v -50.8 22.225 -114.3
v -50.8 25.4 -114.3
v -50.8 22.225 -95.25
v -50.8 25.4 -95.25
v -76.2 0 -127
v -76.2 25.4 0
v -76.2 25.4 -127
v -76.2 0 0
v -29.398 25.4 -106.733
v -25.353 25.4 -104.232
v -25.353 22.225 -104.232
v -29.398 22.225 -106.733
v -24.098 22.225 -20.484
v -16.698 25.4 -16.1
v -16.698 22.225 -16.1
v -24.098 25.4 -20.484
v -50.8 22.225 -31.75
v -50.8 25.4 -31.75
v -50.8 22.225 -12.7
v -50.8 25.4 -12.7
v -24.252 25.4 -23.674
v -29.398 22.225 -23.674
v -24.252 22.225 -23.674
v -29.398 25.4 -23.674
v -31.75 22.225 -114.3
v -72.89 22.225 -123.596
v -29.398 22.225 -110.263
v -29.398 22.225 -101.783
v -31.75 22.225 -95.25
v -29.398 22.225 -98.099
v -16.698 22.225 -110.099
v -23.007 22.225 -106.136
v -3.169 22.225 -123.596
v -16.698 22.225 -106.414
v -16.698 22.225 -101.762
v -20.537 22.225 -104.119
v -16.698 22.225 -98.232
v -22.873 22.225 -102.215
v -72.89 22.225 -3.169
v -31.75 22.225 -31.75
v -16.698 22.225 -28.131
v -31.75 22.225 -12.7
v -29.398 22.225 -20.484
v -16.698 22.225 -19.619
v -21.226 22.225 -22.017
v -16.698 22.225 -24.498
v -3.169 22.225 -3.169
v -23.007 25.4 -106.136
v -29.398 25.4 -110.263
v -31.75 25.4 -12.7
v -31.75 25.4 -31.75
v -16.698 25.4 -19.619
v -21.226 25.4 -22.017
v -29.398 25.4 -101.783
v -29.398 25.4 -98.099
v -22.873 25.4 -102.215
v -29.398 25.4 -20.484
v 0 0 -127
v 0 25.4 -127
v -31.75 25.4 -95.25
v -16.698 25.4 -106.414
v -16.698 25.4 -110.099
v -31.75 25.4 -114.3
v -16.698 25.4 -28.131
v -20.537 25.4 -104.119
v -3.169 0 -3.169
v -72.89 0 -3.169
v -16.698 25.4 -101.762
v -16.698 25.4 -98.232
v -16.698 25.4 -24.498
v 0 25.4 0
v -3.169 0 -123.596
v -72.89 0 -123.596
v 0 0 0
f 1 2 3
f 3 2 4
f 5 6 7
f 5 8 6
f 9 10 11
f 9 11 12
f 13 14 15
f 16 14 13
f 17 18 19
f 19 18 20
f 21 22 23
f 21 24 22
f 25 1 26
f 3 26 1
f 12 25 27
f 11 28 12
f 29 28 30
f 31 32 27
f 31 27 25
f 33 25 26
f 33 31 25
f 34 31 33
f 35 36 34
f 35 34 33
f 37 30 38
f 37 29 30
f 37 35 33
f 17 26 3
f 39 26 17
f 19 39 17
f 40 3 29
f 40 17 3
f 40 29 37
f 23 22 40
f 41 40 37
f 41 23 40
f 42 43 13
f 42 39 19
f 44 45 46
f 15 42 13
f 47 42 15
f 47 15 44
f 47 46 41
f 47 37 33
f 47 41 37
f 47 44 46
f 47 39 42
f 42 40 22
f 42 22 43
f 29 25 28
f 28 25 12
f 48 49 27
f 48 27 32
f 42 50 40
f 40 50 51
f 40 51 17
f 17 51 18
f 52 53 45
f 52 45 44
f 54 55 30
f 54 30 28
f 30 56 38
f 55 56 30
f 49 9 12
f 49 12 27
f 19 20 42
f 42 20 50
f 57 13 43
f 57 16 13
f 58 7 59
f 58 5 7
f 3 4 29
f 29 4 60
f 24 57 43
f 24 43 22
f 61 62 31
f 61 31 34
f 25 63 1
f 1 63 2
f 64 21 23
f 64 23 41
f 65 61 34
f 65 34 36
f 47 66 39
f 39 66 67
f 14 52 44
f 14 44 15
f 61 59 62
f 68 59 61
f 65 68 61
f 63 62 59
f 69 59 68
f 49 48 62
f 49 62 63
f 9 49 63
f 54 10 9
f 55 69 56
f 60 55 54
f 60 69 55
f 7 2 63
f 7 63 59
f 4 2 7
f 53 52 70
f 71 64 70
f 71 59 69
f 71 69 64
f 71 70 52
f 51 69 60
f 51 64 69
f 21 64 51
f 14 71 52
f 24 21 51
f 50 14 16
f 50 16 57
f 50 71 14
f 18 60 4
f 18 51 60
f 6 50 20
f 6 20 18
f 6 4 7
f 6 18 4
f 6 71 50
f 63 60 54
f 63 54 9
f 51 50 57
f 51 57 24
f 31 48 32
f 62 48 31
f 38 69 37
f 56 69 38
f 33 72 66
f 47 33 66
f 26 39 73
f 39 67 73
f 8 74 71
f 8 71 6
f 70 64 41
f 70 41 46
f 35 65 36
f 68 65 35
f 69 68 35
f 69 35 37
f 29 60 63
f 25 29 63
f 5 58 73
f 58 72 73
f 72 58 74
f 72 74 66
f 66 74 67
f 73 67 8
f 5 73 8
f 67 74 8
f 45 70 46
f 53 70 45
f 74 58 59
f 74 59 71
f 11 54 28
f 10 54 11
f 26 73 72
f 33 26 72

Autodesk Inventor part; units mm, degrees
ref_plane "YZ Plane" through (0, 0, 0) normal (1, 0, 0) x (0, 1, 0)
ref_plane "XZ Plane" through (0, 0, 0) normal (0, 1, 0) x (-1, 0, 0)
ref_plane "XY Plane" through (0, 0, 0) normal (0, 0, 1) x (1, 0, 0)
sketch "Sketch1" plane through (0, 0, 0) normal (0, 1, 0) x (-1, 0, 0)
  line L0 (0, 0) -> (76.2, 0)
  line L1 (76.2, 0) -> (76.2, -127)
  line L2 (76.2, -127) -> (0, -127)
  line L3 (0, -127) -> (0, 0)
  dimension "d0" = 76.2
  dimension "d1" = 127
extrude "Extrusion1" add sketch "Sketch1" along normal blind 25.4
sketch "Sketch2" plane through (0, 0, 0) normal (0, -1, 0) x (1, 0, 0)
  line L0 (-3.1691, -3.1691) -> (-72.8902, -3.1691)
  line L1 (-72.8902, -3.1691) -> (-72.8902, -123.5964)
  line L2 (-72.8902, -123.5964) -> (-3.1691, -123.5964)
  line L3 (-3.1691, -123.5964) -> (-3.1691, -3.1691)
  point P0 (0, 0)
extrude "Extrusion2" cut sketch "Sketch2" against normal blind 22.225
sketch "Sketch3" plane through (0, 25.4, 0) normal (0, 1, 0) x (1, 0, 0)
  line L0 (-50.8, 12.7) -> (-31.75, 12.7)
  line L1 (-31.75, 12.7) -> (-31.75, 31.75)
  line L2 (-31.75, 31.75) -> (-50.8, 31.75)
  line L3 (-50.8, 31.75) -> (-50.8, 12.7)
  line L4 (-50.8, 95.25) -> (-31.75, 95.25)
  line L5 (-31.75, 95.25) -> (-31.75, 114.3)
  line L6 (-31.75, 114.3) -> (-50.8, 114.3)
  line L7 (-50.8, 114.3) -> (-50.8, 95.25)
  line L8 (-76.2, 127) -> (-76.2, 0) projected
  line L9 (-76.2, 0) -> (0, 0) projected
  line L10 (0, 127) -> (-76.2, 127) projected
  dimension "d6" = 19.05
  dimension "d7" = 19.05
  dimension "d8" = 25.4
  dimension "d9" = 25.4
  dimension "d10" = 19.05
  dimension "d11" = 19.05
  dimension "d12" = 12.7
  dimension "d13" = 12.7
extrude "Extrusion3" cut sketch "Sketch3" against normal blind 22.225
sketch "Sketch4" plane through (0, 25.4, 0) normal (0, 1, 0) x (1, 0, 0)
  line L0 (-13.7708, 110.3112) -> (-13.7708, 97.845) construction
  line L1 (-13.7708, 97.845) -> (-32.3251, 97.845) construction
  line L2 (-32.3251, 97.845) -> (-32.3251, 110.3112) construction
  line L3 (-32.3251, 110.3112) -> (-13.7708, 110.3112) construction
  line L4 (-12.0313, 30.7306) -> (-12.0313, 13.191) construction
  line L5 (-12.0313, 13.191) -> (-34.0646, 13.191) construction
  line L6 (-34.0646, 13.191) -> (-34.0646, 30.7306) construction
  line L7 (-34.0646, 30.7306) -> (-12.0313, 30.7306) construction
  line L8 (-29.3979, 98.0986) -> (-29.3979, 101.783)
  line L9 (-29.3979, 101.783) -> (-25.3533, 104.2325)
  line L10 (-25.3533, 104.2325) -> (-29.3979, 106.7333)
  line L11 (-29.3979, 106.7333) -> (-29.3979, 110.2634)
  line L12 (-29.3979, 110.2634) -> (-23.0068, 106.1364)
  line L13 (-23.0068, 106.1364) -> (-16.6979, 110.0987)
  line L14 (-16.6979, 110.0987) -> (-16.6979, 106.4143)
  line L15 (-16.6979, 106.4143) -> (-20.5367, 104.1192)
  line L16 (-20.5367, 104.1192) -> (-16.6979, 101.7624)
  line L17 (-16.6979, 101.7624) -> (-16.6979, 98.2324)
  line L18 (-16.6979, 98.2324) -> (-22.873, 102.2153)
  line L19 (-22.873, 102.2153) -> (-29.3979, 98.0986)
  line L20 (-16.6979, 16.0996) -> (-24.0977, 20.4839)
  line L21 (-24.0977, 20.4839) -> (-29.3979, 20.4839)
  line L22 (-29.3979, 20.4839) -> (-29.3979, 23.6743)
  line L23 (-29.3979, 23.6743) -> (-24.2521, 23.6743)
  line L24 (-24.2521, 23.6743) -> (-16.6979, 28.1307)
  line L25 (-16.6979, 28.1307) -> (-16.6979, 24.4977)
  line L26 (-16.6979, 24.4977) -> (-21.2263, 22.0174)
  line L27 (-21.2263, 22.0174) -> (-16.6979, 19.6194)
  line L28 (-16.6979, 19.6194) -> (-16.6979, 16.0996)
  point P0 (0, 0)
extrude "Extrusion4" cut sketch "Sketch4" against normal blind 25.4
properties part number "gamebox"
